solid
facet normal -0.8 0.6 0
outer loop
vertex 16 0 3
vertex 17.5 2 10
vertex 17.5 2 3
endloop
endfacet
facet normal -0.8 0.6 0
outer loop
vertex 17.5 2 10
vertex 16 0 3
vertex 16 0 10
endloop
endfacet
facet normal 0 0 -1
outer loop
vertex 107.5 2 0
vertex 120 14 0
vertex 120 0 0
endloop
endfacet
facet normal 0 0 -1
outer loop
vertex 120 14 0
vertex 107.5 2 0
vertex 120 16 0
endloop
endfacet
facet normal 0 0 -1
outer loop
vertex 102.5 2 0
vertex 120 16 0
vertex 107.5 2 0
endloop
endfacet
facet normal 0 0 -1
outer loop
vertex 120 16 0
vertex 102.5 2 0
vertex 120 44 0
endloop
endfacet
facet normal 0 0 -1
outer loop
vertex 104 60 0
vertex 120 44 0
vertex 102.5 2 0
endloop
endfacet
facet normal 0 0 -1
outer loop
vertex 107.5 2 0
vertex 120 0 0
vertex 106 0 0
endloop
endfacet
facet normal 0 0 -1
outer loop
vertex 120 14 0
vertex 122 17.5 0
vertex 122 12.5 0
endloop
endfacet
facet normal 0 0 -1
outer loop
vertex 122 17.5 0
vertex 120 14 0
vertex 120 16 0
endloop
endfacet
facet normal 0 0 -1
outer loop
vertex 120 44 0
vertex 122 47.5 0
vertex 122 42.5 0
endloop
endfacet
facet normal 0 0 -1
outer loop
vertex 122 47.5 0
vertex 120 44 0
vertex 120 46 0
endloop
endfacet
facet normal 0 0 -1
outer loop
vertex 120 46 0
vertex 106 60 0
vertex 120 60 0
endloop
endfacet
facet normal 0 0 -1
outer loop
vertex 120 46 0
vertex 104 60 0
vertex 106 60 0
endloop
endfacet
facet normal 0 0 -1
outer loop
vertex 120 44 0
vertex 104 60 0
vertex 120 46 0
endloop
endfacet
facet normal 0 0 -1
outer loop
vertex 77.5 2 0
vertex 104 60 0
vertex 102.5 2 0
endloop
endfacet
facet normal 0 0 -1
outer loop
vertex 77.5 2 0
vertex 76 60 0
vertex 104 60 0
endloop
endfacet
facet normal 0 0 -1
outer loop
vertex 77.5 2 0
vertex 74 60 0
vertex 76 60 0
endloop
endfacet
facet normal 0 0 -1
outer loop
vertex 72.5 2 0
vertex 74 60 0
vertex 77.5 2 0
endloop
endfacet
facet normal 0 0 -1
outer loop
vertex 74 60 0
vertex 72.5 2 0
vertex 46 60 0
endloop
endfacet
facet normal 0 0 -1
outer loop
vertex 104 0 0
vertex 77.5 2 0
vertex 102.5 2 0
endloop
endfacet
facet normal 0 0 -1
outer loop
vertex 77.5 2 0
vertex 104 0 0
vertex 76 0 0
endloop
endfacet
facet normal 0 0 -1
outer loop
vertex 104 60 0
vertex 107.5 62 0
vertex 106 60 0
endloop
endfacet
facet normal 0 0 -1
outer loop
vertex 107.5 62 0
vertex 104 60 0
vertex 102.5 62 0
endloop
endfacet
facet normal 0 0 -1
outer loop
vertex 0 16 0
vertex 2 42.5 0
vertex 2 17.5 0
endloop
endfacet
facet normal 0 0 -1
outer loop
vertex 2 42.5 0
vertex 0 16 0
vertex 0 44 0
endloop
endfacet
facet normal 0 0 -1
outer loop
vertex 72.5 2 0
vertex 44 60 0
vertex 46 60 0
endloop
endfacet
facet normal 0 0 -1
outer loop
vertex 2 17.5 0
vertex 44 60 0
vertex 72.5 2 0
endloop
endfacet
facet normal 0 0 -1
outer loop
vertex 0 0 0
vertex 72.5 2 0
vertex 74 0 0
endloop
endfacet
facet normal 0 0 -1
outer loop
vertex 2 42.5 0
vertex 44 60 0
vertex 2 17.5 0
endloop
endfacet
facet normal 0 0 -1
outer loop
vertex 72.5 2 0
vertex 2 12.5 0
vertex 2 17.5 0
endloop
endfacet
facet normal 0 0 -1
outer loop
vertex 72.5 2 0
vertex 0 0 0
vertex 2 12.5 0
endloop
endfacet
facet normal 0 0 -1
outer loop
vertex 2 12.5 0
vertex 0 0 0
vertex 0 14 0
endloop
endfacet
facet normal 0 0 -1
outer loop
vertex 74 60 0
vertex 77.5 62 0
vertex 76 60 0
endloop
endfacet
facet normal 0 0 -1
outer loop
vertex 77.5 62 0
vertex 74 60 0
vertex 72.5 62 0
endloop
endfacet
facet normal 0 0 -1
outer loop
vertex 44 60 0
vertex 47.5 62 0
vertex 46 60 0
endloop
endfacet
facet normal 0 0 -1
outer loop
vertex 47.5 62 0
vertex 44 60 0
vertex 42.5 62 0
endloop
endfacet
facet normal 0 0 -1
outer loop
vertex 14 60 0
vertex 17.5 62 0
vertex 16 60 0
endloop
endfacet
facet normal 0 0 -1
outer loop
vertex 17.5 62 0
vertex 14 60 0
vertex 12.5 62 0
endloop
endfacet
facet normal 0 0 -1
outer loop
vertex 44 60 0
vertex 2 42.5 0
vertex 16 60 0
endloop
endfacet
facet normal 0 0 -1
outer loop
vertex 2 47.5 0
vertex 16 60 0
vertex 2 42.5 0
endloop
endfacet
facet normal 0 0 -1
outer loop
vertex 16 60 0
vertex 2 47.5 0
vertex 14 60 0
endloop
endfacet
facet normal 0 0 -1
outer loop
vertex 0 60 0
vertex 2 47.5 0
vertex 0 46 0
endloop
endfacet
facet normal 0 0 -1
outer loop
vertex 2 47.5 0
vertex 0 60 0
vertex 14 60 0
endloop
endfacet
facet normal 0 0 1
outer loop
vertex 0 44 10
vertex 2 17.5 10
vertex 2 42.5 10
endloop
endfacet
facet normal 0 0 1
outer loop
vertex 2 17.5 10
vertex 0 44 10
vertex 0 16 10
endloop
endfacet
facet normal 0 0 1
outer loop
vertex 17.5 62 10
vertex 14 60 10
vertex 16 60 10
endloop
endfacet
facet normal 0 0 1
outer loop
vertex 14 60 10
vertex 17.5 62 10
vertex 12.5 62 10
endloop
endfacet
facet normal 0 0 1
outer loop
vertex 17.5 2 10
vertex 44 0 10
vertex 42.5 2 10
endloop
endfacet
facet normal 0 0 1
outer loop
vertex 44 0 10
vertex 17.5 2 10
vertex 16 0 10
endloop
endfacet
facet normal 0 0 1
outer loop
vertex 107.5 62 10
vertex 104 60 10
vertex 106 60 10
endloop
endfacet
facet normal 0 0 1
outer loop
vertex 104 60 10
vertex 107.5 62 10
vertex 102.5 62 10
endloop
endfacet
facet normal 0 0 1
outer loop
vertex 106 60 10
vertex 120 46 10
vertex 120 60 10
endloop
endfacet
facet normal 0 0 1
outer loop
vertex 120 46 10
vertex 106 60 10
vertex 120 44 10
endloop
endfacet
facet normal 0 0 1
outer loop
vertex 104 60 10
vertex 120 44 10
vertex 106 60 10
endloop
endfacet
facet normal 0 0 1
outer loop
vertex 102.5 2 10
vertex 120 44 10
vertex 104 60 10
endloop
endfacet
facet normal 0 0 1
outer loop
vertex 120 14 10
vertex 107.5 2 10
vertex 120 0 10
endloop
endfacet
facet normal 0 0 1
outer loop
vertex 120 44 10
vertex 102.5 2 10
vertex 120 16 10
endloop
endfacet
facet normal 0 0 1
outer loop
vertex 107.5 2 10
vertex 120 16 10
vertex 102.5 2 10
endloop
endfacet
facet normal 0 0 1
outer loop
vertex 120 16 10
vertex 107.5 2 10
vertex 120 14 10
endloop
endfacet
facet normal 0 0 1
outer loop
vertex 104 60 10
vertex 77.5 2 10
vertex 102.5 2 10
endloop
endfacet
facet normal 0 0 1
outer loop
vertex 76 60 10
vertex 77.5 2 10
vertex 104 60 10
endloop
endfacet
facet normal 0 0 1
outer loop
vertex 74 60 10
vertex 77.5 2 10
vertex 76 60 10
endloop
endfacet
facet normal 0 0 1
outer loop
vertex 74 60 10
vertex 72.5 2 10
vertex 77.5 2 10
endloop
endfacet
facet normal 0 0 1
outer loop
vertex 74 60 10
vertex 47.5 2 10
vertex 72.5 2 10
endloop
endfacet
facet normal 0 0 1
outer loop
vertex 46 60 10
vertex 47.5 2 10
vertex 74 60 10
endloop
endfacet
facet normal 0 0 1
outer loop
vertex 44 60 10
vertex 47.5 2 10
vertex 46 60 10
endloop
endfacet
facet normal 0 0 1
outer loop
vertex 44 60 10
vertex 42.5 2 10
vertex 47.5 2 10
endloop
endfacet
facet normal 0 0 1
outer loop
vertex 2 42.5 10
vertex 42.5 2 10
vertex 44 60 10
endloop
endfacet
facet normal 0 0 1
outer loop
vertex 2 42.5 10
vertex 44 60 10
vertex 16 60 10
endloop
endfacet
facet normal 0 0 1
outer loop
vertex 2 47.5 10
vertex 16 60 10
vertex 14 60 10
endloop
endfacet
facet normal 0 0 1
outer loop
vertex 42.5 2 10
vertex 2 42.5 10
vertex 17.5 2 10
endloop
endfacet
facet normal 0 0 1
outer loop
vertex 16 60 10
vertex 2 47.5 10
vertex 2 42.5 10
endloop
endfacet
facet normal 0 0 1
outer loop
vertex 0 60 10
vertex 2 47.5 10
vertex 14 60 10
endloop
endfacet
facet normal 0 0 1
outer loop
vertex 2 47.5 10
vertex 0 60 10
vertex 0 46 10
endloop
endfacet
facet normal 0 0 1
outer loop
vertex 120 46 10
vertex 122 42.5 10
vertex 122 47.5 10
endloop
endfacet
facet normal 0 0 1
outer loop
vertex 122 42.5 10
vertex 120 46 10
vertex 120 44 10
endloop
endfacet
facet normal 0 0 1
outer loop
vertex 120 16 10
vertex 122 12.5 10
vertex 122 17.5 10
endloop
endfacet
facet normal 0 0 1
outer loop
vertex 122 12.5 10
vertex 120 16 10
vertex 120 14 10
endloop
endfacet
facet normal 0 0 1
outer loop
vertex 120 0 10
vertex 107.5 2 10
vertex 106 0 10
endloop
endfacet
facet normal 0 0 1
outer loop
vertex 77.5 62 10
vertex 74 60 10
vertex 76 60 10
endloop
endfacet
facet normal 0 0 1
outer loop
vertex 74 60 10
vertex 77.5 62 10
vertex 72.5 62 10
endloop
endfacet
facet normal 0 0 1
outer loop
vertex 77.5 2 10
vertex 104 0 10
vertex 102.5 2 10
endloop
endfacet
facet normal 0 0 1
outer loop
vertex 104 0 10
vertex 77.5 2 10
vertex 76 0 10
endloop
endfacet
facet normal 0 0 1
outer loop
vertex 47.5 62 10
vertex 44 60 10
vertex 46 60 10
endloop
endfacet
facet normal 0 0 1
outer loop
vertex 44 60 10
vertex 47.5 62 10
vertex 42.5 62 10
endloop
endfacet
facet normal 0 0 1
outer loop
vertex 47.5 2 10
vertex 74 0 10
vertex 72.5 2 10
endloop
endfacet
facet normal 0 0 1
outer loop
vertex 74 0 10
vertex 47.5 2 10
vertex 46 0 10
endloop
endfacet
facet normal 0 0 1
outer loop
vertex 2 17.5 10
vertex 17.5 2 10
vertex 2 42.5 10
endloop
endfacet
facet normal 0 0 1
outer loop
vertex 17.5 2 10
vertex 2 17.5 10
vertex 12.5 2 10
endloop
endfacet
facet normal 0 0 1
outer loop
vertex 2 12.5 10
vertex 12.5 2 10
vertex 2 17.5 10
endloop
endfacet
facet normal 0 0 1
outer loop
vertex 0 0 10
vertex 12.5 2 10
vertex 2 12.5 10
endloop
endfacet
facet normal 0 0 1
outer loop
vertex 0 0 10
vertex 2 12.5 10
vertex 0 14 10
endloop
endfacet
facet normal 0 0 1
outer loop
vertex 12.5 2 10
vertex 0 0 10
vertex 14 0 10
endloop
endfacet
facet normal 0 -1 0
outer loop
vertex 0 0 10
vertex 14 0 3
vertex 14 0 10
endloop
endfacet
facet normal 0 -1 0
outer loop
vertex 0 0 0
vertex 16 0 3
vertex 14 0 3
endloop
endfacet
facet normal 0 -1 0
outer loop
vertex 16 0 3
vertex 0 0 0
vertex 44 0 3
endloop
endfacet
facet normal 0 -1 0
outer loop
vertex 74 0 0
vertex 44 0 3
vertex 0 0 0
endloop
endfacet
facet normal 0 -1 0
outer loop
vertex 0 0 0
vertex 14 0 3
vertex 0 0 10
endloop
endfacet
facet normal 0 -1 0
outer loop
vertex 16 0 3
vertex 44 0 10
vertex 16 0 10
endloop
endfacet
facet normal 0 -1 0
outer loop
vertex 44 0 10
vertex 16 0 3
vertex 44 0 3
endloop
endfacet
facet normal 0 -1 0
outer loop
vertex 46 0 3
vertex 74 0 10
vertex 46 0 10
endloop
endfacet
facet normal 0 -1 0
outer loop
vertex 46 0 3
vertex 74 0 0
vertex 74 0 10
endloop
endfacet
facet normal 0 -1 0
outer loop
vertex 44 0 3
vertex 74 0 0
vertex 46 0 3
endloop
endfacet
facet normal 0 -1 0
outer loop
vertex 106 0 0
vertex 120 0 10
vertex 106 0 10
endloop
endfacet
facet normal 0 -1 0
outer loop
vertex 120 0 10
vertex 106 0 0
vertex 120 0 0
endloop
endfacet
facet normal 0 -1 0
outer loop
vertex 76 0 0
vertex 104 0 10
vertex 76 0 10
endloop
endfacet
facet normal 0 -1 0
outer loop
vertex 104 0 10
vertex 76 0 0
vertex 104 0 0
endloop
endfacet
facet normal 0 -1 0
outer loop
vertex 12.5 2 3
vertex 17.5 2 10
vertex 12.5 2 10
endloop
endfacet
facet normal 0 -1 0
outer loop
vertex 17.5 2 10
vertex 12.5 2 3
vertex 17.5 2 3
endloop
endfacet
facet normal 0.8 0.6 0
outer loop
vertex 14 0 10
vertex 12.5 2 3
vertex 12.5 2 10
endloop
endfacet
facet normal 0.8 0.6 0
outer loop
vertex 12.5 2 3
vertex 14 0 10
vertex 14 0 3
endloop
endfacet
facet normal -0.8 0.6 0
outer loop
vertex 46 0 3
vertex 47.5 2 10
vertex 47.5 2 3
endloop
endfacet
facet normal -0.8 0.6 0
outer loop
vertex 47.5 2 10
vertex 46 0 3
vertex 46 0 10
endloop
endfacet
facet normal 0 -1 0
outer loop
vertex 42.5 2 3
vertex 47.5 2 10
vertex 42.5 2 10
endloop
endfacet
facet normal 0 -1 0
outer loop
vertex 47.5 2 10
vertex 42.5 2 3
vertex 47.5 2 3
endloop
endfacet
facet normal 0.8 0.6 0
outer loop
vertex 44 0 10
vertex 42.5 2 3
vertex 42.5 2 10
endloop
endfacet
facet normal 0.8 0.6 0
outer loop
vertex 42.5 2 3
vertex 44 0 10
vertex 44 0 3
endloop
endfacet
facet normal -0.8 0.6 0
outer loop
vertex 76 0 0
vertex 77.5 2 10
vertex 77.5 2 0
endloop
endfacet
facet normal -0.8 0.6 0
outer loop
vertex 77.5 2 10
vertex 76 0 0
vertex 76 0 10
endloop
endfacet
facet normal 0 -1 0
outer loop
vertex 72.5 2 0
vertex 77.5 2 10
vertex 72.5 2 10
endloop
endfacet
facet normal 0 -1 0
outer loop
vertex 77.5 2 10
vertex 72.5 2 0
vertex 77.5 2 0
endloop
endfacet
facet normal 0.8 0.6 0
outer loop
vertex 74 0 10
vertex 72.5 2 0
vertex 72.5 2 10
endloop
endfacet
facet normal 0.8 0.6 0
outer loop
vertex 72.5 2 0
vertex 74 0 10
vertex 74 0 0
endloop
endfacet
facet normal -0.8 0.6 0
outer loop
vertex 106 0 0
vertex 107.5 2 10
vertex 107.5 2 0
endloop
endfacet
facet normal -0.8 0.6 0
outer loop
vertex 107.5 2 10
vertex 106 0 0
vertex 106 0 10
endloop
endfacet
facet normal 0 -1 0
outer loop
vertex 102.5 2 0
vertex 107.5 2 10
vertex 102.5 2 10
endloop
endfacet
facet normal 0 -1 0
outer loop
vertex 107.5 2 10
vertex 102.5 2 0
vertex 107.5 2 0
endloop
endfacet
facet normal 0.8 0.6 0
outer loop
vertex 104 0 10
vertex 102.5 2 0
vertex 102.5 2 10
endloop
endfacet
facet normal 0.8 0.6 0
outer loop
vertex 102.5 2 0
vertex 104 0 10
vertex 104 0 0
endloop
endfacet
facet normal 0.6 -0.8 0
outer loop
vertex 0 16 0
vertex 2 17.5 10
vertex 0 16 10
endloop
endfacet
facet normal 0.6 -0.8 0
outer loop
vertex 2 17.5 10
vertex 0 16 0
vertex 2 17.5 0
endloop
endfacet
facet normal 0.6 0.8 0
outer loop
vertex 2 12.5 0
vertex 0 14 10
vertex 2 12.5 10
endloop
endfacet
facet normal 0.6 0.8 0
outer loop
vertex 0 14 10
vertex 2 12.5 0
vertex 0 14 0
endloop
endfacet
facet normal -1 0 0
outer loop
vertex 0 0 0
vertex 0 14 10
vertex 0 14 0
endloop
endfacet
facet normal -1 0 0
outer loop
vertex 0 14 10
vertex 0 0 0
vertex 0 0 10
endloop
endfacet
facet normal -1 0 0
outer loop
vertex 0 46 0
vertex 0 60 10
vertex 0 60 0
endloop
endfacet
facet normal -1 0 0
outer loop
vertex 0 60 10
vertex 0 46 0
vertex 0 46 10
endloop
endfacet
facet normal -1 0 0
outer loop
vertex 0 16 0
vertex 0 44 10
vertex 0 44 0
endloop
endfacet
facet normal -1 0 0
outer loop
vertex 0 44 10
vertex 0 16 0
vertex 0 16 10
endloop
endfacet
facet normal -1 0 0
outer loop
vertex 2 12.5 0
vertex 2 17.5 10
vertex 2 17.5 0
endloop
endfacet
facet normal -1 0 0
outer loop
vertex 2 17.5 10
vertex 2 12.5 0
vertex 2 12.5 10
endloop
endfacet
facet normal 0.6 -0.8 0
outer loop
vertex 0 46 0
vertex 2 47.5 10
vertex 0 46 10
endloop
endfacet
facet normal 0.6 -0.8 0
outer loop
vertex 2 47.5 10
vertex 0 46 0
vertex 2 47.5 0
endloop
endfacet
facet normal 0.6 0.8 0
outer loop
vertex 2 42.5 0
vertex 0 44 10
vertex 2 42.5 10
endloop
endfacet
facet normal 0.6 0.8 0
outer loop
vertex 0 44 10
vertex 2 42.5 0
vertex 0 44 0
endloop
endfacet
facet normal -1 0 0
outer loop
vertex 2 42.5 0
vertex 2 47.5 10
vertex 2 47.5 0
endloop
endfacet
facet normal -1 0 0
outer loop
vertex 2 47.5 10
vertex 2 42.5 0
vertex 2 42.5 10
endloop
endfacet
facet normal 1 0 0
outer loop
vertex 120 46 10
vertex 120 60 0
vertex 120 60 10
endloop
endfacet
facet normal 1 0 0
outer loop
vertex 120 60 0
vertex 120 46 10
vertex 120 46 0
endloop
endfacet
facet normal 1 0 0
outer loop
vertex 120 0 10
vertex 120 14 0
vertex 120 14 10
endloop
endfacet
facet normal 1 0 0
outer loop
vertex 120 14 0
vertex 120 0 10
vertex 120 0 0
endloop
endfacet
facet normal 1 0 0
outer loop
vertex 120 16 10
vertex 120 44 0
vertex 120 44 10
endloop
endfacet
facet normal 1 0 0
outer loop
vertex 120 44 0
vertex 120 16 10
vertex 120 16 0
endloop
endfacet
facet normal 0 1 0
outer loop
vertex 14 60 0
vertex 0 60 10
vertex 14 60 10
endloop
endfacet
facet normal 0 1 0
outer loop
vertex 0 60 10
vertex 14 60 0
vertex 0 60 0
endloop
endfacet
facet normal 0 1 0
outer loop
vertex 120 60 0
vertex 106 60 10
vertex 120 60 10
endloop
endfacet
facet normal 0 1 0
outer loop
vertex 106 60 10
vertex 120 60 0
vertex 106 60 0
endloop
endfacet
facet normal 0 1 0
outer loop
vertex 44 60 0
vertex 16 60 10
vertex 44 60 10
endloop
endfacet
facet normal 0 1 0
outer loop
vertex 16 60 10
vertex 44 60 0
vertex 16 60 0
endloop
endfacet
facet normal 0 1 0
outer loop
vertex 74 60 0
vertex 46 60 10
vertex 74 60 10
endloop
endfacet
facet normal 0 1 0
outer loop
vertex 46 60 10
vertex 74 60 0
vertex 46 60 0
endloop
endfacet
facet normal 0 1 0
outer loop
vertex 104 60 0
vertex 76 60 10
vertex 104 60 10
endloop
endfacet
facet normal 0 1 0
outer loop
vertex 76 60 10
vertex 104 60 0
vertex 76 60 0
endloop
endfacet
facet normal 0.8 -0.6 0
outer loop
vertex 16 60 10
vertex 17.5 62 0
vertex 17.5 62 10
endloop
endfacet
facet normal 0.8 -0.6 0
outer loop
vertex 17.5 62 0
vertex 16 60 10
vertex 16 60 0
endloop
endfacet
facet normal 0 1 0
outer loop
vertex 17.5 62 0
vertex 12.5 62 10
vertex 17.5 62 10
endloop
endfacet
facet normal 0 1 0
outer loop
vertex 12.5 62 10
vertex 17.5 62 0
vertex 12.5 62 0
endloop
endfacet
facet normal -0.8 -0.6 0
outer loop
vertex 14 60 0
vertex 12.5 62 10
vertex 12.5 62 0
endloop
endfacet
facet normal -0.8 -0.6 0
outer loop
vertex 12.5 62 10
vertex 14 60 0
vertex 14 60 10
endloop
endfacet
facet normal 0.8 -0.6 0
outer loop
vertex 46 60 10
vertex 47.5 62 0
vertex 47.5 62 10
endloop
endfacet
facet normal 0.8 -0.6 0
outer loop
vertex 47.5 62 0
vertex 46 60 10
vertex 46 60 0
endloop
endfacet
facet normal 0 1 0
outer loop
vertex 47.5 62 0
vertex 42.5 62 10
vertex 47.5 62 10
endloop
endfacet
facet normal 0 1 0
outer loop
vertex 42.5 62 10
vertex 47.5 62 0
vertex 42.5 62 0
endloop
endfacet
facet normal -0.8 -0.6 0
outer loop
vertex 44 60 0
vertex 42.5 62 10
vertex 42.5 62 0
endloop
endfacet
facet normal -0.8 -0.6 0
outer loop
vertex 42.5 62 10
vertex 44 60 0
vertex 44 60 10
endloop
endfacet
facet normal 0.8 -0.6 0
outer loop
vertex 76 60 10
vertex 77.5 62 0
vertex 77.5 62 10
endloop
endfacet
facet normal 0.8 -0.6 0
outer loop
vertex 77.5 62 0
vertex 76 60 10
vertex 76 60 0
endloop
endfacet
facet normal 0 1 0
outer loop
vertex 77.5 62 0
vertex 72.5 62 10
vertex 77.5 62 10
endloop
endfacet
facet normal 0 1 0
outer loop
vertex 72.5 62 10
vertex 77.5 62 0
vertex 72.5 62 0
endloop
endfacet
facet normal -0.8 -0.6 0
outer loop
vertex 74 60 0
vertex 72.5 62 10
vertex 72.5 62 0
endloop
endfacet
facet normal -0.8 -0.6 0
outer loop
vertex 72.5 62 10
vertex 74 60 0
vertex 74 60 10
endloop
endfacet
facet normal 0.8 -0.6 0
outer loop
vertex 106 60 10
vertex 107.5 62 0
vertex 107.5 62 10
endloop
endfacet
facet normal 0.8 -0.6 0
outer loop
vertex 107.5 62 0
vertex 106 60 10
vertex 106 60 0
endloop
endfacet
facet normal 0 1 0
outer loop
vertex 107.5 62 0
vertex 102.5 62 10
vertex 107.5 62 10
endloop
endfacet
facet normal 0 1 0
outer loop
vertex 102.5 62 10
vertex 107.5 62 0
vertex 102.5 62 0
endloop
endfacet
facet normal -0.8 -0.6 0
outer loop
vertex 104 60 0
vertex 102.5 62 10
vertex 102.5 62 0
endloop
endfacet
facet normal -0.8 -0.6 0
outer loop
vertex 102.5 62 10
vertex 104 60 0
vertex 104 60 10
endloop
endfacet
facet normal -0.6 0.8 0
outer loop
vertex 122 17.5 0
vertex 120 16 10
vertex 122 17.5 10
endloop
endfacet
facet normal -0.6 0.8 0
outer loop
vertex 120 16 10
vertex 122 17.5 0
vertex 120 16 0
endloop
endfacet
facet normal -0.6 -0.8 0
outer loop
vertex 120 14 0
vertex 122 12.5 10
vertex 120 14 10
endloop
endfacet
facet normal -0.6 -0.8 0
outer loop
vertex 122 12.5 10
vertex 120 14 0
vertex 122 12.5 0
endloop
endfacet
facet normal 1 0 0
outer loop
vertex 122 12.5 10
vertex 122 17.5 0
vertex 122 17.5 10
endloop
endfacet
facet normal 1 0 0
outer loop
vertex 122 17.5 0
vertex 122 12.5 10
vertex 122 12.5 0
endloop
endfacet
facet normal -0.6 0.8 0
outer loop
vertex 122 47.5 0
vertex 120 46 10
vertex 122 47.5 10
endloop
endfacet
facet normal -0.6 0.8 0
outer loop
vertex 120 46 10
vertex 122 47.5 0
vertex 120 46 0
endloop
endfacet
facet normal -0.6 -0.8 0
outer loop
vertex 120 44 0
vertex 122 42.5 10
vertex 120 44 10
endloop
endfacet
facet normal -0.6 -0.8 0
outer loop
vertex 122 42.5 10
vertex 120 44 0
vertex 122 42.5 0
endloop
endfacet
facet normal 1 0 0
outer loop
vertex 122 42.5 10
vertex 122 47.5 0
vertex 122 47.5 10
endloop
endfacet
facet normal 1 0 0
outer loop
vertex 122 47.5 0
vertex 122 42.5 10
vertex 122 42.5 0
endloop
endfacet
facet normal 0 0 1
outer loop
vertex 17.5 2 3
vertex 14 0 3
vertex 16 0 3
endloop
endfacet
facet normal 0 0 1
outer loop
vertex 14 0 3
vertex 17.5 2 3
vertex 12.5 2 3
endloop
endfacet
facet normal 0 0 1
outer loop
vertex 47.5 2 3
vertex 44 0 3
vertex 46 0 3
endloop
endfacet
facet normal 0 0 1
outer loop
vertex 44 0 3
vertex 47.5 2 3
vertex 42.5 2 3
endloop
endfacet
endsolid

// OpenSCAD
// file: solder_stuff_station.scad
$fn = 100;

block_side_length = 30;

module connector() {
     linear_extrude(10) {
          polygon([[0, 0], [5, 0], [3.5, 2], [1.5, 2]]);
     }
}

module Block(width_scale=1, length_scale=1, height=10) {
     difference() {     
          cube([width_scale * block_side_length, length_scale * block_side_length, height]);

          // Groove X
          for(pos = [1:width_scale]) {
               translate([((pos - 1) * block_side_length) + 17.5, 2, 0]) rotate([0, 0, 180]) connector();
          }

          // Groove Y
          for(pos = [1:length_scale]) {
               translate([2, ((pos - 1) * block_side_length) + 12.5, 0]) rotate([0, 0, 90]) connector();
          }
     }
     
     // Tounge X
     for(pos = [1:width_scale]) {
          translate([((pos - 1) * block_side_length) + 17.5,
                     block_side_length * length_scale + 2, 0]) rotate([0, 0, 180]) connector();
     }

     // Tounge Y
     for(pos = [1:length_scale]) {
          translate([block_side_length * width_scale + 2,
                     ((pos - 1) * block_side_length) + 12.5, 0]) rotate([0, 0, 90]) connector();
     }
}

module GreatBlock() {
     Block(2, 2);
}

function BlockLength(scale=1) = block_side_length * scale;
// GreatBlock(1, 1);
//Block(3,2);
// main file
use <solder_stuff_station.scad>;

module stand() {
     rotate() {
          linear_extrude(3) {
               difference() {
                    polygon([[0,0], [60,0], [60,60]]);
                    polygon([[12.5,5], [55,5], [55,47.5]]);
               }
               //rotate([0,0,45]) square([20,3]);
               translate([-3,3,0]) {
                    rotate([0,0, 315]) {        
                         translate([0, 10]) square([5,19]);
                         translate([0, 55]) square([5,19]);
                    }
               }
          }
    }
}

Block(4, 2);
stand();
